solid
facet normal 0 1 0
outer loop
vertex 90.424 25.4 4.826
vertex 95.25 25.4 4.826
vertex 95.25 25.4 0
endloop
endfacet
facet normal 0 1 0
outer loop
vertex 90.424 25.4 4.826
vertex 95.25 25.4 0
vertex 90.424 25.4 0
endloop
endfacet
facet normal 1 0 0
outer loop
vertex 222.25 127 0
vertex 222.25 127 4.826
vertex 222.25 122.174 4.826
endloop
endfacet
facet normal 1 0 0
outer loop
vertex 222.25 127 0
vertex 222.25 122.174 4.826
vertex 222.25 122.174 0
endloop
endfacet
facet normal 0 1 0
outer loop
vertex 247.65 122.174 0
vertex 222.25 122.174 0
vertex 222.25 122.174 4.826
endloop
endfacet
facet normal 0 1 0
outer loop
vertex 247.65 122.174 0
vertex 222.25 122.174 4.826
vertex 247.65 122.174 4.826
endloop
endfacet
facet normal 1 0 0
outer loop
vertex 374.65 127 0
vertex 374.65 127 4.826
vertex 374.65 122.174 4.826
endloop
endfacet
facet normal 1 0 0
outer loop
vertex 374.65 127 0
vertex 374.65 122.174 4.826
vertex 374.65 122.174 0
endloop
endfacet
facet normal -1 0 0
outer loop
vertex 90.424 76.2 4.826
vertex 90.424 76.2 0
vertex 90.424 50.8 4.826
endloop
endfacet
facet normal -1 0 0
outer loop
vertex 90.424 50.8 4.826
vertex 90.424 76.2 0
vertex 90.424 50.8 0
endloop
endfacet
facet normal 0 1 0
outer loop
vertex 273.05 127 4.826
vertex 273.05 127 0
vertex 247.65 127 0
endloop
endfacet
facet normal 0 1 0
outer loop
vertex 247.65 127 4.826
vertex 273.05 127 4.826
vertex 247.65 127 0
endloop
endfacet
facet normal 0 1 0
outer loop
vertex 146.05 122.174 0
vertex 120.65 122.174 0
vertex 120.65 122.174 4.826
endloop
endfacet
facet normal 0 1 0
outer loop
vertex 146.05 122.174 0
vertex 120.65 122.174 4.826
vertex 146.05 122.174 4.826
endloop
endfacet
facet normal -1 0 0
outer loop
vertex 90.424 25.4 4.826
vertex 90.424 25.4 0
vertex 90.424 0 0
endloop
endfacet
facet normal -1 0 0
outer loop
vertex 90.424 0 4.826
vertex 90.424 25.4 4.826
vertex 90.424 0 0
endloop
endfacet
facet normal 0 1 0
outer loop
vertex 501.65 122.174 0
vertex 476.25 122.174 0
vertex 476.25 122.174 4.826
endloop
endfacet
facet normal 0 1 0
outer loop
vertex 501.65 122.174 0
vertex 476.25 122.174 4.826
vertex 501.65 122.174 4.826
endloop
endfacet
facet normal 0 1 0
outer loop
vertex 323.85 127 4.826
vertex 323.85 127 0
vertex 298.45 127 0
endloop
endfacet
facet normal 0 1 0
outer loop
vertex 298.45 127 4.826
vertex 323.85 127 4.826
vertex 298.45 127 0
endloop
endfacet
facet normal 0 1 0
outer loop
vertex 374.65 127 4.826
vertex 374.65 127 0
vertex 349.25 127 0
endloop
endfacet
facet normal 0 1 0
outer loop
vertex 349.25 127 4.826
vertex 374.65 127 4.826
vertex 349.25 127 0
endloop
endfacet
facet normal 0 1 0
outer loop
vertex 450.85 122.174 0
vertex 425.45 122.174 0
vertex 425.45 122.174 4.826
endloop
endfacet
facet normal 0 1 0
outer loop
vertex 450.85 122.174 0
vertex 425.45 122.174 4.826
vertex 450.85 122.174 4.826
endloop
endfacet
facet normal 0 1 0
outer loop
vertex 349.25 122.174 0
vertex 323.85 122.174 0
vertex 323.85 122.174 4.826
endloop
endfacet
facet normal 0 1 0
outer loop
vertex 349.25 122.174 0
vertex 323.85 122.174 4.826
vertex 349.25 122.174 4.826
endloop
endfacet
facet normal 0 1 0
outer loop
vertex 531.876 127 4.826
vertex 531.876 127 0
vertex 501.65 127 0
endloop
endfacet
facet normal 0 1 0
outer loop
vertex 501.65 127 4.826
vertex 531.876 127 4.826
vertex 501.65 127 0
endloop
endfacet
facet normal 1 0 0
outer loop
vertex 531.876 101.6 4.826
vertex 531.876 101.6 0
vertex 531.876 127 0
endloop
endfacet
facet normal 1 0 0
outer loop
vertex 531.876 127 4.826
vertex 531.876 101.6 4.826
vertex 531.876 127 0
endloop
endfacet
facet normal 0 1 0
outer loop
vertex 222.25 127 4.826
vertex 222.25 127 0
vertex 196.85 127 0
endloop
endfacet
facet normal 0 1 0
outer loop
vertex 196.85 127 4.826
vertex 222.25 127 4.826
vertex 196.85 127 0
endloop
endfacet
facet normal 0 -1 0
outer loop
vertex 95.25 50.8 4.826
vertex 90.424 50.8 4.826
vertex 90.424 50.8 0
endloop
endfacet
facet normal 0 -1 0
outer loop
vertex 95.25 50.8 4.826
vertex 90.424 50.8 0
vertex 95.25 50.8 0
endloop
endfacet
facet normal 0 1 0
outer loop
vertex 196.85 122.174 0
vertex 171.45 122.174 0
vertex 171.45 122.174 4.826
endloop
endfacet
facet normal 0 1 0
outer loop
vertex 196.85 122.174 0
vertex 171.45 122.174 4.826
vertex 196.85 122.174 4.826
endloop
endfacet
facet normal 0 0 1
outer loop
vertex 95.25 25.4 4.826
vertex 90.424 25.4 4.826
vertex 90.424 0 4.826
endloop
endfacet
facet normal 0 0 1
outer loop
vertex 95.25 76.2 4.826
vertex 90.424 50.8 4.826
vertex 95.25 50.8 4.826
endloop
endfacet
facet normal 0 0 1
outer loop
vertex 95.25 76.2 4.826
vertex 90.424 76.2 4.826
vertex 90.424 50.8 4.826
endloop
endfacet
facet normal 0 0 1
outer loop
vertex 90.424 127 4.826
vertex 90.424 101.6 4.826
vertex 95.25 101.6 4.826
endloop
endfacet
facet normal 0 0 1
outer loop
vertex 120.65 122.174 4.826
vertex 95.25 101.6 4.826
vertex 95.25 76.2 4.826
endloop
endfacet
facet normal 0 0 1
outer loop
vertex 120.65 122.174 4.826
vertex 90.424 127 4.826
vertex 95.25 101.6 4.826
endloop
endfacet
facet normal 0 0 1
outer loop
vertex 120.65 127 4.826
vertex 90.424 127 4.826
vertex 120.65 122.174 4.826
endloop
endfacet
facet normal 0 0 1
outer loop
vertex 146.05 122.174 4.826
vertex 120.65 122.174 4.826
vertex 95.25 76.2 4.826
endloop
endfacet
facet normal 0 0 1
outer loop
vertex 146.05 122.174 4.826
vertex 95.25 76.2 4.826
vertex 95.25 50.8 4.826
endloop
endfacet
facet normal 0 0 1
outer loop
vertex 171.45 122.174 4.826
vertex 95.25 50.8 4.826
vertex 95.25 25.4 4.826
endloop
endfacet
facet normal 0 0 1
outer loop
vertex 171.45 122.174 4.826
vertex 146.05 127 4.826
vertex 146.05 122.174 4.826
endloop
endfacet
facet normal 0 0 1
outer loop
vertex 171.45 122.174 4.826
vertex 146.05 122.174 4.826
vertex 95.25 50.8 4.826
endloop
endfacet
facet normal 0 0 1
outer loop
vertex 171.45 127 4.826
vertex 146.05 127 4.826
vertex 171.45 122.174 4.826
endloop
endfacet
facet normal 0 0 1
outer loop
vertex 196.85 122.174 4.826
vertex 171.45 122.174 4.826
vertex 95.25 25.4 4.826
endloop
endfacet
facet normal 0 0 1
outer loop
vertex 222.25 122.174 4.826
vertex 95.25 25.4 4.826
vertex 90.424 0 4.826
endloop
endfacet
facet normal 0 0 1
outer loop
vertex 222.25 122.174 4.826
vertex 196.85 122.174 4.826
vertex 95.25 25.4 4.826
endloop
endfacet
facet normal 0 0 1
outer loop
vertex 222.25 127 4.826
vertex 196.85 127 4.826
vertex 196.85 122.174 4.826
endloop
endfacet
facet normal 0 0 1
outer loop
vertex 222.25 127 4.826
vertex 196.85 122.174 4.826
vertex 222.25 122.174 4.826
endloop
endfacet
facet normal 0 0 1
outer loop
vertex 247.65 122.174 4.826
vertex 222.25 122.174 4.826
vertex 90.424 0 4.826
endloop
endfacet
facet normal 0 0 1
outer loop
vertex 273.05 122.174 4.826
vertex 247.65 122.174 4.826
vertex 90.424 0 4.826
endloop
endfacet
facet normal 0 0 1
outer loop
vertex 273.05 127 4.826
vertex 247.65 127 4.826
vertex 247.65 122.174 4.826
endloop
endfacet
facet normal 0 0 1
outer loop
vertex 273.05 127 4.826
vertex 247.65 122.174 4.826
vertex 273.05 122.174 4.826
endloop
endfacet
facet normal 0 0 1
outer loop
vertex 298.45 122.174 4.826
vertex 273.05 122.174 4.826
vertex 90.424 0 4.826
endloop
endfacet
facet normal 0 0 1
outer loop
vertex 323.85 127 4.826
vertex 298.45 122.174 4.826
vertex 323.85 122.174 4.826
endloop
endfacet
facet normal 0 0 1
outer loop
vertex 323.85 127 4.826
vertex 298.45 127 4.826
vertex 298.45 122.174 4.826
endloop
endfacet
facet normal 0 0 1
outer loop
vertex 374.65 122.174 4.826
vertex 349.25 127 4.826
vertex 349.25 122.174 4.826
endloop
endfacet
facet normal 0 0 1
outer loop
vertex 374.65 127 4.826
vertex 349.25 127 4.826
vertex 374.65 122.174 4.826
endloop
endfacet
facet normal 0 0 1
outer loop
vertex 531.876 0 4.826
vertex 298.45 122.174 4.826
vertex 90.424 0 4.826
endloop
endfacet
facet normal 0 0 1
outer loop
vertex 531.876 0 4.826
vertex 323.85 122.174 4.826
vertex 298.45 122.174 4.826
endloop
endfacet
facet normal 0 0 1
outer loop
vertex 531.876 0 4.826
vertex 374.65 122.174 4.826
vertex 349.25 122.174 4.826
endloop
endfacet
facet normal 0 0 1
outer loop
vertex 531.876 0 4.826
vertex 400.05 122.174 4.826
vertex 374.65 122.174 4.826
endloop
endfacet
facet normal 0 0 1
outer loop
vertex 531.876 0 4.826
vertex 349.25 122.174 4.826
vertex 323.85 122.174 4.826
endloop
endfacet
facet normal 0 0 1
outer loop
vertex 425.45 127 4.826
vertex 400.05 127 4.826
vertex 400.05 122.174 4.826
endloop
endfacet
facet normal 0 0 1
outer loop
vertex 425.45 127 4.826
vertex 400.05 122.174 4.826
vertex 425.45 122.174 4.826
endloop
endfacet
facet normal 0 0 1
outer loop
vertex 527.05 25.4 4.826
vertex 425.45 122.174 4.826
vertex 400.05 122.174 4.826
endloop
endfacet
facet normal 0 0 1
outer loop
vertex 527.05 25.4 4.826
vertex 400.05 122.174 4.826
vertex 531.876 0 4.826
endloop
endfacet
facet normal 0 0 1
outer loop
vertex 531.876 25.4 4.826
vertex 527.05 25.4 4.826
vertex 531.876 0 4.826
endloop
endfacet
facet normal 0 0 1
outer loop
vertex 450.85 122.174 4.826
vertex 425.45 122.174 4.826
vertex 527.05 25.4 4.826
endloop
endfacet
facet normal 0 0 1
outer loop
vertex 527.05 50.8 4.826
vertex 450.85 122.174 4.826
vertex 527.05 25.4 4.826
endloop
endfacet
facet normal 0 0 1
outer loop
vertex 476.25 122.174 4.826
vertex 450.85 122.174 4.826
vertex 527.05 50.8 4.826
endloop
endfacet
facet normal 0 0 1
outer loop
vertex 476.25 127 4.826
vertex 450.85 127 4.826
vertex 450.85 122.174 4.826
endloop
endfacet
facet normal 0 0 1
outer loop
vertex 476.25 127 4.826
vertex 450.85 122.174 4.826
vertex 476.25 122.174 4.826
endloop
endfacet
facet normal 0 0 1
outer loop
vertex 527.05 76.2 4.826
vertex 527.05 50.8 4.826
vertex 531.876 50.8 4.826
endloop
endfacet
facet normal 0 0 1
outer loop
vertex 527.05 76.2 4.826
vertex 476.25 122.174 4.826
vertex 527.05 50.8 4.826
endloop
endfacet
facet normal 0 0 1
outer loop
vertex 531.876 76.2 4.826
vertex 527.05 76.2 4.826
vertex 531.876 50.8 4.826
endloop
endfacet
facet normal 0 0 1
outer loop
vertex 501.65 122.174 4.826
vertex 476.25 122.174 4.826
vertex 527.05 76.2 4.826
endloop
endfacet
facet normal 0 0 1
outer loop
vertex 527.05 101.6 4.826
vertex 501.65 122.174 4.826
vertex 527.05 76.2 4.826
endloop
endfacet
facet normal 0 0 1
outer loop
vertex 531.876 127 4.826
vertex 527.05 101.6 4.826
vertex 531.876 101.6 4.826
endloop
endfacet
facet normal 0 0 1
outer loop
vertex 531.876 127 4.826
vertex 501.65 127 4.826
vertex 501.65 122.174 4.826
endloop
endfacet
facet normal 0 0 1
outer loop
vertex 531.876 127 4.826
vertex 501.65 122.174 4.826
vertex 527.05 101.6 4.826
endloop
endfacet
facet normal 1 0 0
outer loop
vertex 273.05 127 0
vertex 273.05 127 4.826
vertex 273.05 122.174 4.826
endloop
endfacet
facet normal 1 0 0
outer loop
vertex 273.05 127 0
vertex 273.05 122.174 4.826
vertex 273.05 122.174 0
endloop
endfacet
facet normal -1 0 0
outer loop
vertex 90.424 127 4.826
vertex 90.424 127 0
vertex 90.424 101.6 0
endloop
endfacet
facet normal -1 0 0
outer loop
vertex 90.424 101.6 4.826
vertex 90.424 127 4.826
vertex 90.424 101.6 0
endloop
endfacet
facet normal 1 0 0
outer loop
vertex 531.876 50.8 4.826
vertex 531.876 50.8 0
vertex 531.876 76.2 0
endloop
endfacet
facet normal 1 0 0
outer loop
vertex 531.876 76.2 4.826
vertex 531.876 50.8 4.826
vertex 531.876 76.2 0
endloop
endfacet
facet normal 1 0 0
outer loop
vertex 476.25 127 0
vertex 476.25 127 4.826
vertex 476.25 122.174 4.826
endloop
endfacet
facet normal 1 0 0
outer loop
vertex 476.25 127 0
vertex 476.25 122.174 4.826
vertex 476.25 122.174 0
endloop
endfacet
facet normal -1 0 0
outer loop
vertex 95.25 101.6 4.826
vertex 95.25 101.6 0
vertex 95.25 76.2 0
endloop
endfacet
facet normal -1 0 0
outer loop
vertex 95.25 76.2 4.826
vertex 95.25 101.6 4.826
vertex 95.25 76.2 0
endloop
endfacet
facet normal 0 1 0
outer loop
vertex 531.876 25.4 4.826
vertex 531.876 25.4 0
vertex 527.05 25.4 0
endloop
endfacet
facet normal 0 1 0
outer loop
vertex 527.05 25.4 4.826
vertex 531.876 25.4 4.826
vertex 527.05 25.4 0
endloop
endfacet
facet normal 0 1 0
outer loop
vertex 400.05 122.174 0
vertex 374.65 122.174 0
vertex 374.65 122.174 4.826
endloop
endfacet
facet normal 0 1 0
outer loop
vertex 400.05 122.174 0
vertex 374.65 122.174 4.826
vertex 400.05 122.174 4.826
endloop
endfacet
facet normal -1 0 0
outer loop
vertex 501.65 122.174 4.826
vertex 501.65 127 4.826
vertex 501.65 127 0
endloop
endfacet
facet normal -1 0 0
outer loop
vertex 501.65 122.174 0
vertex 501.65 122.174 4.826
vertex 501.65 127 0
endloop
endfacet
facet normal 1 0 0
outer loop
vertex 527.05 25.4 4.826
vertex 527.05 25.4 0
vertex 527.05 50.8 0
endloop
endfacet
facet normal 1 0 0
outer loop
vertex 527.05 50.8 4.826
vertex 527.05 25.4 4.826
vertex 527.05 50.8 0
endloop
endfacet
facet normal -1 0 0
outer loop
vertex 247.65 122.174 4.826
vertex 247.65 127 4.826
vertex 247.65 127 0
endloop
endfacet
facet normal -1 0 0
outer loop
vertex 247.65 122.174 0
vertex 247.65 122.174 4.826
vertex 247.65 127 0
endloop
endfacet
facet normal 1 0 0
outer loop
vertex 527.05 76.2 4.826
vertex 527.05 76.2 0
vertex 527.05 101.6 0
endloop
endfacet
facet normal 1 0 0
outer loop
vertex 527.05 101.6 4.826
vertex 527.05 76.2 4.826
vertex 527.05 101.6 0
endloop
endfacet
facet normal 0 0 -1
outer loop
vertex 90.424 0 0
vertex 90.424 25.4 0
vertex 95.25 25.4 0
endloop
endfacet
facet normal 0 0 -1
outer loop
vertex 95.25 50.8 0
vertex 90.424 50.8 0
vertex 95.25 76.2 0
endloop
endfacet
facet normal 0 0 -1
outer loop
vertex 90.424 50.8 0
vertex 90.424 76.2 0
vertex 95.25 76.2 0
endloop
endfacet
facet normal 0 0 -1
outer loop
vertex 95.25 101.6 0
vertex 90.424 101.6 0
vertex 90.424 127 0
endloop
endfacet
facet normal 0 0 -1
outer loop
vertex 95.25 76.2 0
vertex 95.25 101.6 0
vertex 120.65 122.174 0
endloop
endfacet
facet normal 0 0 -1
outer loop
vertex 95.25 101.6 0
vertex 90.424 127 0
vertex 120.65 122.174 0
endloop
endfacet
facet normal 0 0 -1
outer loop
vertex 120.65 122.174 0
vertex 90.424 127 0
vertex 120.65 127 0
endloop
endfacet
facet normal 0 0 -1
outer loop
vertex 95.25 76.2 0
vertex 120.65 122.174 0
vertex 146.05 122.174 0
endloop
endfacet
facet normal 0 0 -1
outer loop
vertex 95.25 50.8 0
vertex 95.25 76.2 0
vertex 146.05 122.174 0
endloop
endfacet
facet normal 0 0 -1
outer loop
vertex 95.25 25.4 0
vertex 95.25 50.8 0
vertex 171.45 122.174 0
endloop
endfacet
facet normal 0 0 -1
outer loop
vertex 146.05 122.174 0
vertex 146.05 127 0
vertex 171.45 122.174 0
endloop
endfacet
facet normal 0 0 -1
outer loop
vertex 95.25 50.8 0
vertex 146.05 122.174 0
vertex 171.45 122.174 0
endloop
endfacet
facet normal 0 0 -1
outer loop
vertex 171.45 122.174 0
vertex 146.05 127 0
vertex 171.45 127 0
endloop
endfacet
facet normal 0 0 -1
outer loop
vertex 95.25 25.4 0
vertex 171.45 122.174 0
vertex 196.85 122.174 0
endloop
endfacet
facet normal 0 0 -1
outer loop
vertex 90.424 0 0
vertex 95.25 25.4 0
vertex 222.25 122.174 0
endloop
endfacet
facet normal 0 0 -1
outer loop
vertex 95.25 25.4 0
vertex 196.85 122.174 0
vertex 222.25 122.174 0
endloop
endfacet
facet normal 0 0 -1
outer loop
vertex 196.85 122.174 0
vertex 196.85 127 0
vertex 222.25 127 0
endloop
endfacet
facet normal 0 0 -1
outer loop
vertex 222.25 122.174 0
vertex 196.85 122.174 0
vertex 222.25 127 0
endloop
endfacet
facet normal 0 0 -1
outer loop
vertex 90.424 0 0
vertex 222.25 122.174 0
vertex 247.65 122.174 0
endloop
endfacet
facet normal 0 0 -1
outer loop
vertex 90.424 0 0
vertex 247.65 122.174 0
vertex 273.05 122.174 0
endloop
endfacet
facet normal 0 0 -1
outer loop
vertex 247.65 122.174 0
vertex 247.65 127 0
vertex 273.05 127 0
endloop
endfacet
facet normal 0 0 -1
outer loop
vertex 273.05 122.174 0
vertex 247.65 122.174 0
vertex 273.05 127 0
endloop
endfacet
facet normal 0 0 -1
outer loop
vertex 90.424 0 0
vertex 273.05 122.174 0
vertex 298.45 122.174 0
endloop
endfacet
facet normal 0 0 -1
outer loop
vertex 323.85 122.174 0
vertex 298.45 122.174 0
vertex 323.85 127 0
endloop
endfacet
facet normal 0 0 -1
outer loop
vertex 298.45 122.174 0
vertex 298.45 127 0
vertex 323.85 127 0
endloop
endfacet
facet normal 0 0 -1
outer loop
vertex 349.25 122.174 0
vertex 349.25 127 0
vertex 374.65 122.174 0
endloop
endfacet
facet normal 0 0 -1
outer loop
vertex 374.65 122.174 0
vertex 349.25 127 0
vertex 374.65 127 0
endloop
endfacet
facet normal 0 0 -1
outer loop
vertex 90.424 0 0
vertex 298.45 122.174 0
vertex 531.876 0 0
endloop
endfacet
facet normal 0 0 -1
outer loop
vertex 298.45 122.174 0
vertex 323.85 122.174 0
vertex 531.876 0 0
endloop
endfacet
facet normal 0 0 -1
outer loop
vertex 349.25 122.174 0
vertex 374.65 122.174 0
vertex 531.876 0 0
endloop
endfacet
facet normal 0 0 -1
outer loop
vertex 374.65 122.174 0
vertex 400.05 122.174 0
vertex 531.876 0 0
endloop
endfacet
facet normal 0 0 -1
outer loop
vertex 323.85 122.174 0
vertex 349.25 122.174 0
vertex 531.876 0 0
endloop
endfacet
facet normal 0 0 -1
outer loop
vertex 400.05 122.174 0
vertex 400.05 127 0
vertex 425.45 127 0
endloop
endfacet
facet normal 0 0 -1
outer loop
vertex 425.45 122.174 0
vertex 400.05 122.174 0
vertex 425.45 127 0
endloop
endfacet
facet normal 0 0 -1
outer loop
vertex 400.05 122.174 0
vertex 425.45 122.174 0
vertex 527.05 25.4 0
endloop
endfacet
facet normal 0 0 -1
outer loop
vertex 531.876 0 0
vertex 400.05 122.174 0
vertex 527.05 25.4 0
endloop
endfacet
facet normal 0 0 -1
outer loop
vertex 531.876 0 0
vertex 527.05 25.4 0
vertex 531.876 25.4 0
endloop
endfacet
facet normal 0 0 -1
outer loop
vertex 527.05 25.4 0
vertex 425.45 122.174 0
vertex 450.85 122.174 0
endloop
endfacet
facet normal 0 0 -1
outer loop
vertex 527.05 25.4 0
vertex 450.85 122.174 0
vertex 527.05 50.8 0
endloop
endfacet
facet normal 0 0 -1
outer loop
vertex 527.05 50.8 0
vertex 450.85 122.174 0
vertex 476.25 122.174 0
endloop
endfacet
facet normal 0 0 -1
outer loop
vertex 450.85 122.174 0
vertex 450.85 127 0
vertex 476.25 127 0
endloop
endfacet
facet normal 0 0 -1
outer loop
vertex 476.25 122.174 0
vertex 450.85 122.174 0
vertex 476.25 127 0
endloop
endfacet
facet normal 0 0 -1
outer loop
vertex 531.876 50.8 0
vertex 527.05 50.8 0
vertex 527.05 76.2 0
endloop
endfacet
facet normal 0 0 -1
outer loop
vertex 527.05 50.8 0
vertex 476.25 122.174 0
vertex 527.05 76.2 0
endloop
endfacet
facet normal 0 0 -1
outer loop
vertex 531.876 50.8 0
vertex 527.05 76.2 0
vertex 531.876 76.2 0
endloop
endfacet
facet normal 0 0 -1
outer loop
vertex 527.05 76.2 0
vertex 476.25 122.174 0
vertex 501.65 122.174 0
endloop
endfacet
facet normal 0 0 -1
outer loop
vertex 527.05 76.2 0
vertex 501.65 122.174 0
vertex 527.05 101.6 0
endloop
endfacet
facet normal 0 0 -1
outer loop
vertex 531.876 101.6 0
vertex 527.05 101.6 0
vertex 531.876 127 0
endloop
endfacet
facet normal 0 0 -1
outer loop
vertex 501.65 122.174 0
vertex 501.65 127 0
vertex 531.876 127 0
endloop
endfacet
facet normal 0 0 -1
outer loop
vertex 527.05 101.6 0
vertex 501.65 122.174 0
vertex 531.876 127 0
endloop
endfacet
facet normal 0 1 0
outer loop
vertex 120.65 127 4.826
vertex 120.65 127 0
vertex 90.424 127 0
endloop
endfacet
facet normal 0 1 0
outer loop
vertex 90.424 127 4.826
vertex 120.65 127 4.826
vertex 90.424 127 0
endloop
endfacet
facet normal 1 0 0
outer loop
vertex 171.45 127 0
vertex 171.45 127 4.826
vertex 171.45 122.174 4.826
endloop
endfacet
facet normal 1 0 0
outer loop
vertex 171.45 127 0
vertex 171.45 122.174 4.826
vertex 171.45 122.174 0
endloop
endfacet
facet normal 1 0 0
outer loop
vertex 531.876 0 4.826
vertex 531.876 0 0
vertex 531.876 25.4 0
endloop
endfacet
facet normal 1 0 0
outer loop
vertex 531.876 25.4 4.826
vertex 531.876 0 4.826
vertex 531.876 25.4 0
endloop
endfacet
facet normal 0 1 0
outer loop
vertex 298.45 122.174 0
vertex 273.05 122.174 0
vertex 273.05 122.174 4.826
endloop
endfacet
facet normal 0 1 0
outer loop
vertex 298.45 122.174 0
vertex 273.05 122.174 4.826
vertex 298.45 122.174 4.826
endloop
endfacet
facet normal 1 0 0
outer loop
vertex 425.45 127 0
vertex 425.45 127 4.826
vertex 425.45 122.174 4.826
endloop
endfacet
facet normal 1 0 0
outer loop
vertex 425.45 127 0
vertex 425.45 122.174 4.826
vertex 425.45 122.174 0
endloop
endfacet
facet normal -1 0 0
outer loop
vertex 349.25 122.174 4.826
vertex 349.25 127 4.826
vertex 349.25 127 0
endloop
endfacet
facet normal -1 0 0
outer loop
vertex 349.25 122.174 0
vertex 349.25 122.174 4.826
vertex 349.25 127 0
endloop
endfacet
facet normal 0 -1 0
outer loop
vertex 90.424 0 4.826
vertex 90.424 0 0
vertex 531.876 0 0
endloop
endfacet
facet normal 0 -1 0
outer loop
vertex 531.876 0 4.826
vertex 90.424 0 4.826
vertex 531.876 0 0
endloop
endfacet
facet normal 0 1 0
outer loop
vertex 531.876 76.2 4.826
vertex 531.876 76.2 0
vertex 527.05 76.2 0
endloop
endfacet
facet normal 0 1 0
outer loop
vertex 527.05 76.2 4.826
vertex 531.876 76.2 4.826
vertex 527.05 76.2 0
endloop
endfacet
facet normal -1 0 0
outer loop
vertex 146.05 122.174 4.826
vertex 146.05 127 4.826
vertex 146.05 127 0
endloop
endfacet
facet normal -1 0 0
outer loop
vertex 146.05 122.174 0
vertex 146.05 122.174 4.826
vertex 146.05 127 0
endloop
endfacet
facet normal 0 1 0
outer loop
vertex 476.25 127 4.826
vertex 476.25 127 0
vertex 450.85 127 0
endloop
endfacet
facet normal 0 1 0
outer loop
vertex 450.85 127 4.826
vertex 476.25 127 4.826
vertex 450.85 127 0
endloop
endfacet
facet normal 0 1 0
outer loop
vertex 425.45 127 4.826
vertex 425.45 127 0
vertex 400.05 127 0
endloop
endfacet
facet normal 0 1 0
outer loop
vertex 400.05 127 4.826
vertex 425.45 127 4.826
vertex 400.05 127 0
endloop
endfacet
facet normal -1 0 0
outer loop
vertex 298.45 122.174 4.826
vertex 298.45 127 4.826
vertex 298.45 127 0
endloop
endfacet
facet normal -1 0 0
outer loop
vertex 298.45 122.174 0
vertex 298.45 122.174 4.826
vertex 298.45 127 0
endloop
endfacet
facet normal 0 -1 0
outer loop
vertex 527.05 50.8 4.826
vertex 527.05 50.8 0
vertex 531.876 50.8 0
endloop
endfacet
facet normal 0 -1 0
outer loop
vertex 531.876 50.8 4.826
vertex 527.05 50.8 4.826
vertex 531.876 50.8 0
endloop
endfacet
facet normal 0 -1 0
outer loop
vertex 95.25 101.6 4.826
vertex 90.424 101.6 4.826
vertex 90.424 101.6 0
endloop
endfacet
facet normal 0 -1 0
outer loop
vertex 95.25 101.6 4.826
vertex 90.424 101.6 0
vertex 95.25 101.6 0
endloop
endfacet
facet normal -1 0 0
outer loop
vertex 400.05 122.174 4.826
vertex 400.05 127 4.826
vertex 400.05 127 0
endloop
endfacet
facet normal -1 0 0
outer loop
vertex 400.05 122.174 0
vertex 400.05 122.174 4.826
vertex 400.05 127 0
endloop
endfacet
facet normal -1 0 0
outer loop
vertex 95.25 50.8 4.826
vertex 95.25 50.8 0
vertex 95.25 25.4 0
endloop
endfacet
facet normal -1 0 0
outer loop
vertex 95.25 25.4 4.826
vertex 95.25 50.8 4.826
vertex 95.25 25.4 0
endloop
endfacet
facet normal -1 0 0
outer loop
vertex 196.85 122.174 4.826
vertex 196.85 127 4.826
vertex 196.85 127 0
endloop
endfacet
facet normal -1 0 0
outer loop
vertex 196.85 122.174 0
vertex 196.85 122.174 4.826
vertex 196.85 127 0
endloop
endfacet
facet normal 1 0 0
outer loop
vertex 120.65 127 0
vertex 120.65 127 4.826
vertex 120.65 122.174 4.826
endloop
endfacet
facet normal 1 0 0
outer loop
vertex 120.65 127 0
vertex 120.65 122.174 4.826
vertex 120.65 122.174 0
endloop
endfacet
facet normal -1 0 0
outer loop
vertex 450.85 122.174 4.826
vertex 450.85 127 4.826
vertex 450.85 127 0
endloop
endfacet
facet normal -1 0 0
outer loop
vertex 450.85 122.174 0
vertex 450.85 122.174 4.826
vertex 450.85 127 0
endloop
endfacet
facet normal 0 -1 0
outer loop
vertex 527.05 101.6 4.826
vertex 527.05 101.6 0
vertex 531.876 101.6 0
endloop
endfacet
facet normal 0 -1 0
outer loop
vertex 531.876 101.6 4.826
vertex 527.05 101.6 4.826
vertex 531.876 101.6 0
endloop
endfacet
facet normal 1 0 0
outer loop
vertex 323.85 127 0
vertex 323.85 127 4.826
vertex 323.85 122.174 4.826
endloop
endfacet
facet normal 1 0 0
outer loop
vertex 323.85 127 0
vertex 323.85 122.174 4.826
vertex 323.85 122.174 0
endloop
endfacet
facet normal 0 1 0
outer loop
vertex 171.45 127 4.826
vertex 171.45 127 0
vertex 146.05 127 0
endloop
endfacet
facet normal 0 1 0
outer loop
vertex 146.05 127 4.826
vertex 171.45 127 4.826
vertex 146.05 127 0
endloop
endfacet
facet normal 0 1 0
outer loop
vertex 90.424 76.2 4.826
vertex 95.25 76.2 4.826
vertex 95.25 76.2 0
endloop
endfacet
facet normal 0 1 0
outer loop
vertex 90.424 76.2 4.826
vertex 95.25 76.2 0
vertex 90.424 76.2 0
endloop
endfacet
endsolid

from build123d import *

# Parameters (mm, degrees)
BOSS_EXTRUDE1_DEPTH = 4.826
SKETCH2_W           = 25.4
SKETCH2_H           = 4.826
CUT_EXTRUDE1_DEPTH  = 4.826


with BuildPart() as part:
    # Sketch1 → Boss-Extrude1 (new body)
    with BuildSketch(Plane.XY):
        Polygon((95.25, 50.8), (95.25, 25.4), (90.424, 25.4), (90.424, 0), (95.25, 0), (527.05, 0), (531.876, 0), (531.876, 25.4), (527.05, 25.4), (527.05, 50.8), (531.876, 50.8), (531.876, 76.2), (527.05, 76.2), (527.05, 101.6), (531.876, 101.6), (531.876, 127), (90.424, 127), (90.424, 101.6), (95.25, 101.6), (95.25, 76.2), (90.424, 76.2), (90.424, 50.8), align=None)
    extrude(amount=BOSS_EXTRUDE1_DEPTH)

    # Sketch2 → Cut-Extrude1 (cut)
    with BuildSketch(Plane(origin=(0, 127, 0), x_dir=(1, 0, 0), z_dir=(0, 1, 0))):
        with Locations((133.35, -2.413)):
            Rectangle(SKETCH2_W, SKETCH2_H)
        with Locations((184.15, -2.413)):
            Rectangle(SKETCH2_W, SKETCH2_H)
        with Locations((234.95, -2.413)):
            Rectangle(SKETCH2_W, SKETCH2_H)
        with Locations((285.75, -2.413)):
            Rectangle(SKETCH2_W, SKETCH2_H)
        with Locations((336.55, -2.413)):
            Rectangle(SKETCH2_W, SKETCH2_H)
        with Locations((387.35, -2.413)):
            Rectangle(SKETCH2_W, SKETCH2_H)
        with Locations((438.15, -2.413)):
            Rectangle(SKETCH2_W, SKETCH2_H)
        with Locations((488.95, -2.413)):
            Rectangle(SKETCH2_W, SKETCH2_H)
    extrude(amount=-CUT_EXTRUDE1_DEPTH, mode=Mode.SUBTRACT)


solid = part.part
